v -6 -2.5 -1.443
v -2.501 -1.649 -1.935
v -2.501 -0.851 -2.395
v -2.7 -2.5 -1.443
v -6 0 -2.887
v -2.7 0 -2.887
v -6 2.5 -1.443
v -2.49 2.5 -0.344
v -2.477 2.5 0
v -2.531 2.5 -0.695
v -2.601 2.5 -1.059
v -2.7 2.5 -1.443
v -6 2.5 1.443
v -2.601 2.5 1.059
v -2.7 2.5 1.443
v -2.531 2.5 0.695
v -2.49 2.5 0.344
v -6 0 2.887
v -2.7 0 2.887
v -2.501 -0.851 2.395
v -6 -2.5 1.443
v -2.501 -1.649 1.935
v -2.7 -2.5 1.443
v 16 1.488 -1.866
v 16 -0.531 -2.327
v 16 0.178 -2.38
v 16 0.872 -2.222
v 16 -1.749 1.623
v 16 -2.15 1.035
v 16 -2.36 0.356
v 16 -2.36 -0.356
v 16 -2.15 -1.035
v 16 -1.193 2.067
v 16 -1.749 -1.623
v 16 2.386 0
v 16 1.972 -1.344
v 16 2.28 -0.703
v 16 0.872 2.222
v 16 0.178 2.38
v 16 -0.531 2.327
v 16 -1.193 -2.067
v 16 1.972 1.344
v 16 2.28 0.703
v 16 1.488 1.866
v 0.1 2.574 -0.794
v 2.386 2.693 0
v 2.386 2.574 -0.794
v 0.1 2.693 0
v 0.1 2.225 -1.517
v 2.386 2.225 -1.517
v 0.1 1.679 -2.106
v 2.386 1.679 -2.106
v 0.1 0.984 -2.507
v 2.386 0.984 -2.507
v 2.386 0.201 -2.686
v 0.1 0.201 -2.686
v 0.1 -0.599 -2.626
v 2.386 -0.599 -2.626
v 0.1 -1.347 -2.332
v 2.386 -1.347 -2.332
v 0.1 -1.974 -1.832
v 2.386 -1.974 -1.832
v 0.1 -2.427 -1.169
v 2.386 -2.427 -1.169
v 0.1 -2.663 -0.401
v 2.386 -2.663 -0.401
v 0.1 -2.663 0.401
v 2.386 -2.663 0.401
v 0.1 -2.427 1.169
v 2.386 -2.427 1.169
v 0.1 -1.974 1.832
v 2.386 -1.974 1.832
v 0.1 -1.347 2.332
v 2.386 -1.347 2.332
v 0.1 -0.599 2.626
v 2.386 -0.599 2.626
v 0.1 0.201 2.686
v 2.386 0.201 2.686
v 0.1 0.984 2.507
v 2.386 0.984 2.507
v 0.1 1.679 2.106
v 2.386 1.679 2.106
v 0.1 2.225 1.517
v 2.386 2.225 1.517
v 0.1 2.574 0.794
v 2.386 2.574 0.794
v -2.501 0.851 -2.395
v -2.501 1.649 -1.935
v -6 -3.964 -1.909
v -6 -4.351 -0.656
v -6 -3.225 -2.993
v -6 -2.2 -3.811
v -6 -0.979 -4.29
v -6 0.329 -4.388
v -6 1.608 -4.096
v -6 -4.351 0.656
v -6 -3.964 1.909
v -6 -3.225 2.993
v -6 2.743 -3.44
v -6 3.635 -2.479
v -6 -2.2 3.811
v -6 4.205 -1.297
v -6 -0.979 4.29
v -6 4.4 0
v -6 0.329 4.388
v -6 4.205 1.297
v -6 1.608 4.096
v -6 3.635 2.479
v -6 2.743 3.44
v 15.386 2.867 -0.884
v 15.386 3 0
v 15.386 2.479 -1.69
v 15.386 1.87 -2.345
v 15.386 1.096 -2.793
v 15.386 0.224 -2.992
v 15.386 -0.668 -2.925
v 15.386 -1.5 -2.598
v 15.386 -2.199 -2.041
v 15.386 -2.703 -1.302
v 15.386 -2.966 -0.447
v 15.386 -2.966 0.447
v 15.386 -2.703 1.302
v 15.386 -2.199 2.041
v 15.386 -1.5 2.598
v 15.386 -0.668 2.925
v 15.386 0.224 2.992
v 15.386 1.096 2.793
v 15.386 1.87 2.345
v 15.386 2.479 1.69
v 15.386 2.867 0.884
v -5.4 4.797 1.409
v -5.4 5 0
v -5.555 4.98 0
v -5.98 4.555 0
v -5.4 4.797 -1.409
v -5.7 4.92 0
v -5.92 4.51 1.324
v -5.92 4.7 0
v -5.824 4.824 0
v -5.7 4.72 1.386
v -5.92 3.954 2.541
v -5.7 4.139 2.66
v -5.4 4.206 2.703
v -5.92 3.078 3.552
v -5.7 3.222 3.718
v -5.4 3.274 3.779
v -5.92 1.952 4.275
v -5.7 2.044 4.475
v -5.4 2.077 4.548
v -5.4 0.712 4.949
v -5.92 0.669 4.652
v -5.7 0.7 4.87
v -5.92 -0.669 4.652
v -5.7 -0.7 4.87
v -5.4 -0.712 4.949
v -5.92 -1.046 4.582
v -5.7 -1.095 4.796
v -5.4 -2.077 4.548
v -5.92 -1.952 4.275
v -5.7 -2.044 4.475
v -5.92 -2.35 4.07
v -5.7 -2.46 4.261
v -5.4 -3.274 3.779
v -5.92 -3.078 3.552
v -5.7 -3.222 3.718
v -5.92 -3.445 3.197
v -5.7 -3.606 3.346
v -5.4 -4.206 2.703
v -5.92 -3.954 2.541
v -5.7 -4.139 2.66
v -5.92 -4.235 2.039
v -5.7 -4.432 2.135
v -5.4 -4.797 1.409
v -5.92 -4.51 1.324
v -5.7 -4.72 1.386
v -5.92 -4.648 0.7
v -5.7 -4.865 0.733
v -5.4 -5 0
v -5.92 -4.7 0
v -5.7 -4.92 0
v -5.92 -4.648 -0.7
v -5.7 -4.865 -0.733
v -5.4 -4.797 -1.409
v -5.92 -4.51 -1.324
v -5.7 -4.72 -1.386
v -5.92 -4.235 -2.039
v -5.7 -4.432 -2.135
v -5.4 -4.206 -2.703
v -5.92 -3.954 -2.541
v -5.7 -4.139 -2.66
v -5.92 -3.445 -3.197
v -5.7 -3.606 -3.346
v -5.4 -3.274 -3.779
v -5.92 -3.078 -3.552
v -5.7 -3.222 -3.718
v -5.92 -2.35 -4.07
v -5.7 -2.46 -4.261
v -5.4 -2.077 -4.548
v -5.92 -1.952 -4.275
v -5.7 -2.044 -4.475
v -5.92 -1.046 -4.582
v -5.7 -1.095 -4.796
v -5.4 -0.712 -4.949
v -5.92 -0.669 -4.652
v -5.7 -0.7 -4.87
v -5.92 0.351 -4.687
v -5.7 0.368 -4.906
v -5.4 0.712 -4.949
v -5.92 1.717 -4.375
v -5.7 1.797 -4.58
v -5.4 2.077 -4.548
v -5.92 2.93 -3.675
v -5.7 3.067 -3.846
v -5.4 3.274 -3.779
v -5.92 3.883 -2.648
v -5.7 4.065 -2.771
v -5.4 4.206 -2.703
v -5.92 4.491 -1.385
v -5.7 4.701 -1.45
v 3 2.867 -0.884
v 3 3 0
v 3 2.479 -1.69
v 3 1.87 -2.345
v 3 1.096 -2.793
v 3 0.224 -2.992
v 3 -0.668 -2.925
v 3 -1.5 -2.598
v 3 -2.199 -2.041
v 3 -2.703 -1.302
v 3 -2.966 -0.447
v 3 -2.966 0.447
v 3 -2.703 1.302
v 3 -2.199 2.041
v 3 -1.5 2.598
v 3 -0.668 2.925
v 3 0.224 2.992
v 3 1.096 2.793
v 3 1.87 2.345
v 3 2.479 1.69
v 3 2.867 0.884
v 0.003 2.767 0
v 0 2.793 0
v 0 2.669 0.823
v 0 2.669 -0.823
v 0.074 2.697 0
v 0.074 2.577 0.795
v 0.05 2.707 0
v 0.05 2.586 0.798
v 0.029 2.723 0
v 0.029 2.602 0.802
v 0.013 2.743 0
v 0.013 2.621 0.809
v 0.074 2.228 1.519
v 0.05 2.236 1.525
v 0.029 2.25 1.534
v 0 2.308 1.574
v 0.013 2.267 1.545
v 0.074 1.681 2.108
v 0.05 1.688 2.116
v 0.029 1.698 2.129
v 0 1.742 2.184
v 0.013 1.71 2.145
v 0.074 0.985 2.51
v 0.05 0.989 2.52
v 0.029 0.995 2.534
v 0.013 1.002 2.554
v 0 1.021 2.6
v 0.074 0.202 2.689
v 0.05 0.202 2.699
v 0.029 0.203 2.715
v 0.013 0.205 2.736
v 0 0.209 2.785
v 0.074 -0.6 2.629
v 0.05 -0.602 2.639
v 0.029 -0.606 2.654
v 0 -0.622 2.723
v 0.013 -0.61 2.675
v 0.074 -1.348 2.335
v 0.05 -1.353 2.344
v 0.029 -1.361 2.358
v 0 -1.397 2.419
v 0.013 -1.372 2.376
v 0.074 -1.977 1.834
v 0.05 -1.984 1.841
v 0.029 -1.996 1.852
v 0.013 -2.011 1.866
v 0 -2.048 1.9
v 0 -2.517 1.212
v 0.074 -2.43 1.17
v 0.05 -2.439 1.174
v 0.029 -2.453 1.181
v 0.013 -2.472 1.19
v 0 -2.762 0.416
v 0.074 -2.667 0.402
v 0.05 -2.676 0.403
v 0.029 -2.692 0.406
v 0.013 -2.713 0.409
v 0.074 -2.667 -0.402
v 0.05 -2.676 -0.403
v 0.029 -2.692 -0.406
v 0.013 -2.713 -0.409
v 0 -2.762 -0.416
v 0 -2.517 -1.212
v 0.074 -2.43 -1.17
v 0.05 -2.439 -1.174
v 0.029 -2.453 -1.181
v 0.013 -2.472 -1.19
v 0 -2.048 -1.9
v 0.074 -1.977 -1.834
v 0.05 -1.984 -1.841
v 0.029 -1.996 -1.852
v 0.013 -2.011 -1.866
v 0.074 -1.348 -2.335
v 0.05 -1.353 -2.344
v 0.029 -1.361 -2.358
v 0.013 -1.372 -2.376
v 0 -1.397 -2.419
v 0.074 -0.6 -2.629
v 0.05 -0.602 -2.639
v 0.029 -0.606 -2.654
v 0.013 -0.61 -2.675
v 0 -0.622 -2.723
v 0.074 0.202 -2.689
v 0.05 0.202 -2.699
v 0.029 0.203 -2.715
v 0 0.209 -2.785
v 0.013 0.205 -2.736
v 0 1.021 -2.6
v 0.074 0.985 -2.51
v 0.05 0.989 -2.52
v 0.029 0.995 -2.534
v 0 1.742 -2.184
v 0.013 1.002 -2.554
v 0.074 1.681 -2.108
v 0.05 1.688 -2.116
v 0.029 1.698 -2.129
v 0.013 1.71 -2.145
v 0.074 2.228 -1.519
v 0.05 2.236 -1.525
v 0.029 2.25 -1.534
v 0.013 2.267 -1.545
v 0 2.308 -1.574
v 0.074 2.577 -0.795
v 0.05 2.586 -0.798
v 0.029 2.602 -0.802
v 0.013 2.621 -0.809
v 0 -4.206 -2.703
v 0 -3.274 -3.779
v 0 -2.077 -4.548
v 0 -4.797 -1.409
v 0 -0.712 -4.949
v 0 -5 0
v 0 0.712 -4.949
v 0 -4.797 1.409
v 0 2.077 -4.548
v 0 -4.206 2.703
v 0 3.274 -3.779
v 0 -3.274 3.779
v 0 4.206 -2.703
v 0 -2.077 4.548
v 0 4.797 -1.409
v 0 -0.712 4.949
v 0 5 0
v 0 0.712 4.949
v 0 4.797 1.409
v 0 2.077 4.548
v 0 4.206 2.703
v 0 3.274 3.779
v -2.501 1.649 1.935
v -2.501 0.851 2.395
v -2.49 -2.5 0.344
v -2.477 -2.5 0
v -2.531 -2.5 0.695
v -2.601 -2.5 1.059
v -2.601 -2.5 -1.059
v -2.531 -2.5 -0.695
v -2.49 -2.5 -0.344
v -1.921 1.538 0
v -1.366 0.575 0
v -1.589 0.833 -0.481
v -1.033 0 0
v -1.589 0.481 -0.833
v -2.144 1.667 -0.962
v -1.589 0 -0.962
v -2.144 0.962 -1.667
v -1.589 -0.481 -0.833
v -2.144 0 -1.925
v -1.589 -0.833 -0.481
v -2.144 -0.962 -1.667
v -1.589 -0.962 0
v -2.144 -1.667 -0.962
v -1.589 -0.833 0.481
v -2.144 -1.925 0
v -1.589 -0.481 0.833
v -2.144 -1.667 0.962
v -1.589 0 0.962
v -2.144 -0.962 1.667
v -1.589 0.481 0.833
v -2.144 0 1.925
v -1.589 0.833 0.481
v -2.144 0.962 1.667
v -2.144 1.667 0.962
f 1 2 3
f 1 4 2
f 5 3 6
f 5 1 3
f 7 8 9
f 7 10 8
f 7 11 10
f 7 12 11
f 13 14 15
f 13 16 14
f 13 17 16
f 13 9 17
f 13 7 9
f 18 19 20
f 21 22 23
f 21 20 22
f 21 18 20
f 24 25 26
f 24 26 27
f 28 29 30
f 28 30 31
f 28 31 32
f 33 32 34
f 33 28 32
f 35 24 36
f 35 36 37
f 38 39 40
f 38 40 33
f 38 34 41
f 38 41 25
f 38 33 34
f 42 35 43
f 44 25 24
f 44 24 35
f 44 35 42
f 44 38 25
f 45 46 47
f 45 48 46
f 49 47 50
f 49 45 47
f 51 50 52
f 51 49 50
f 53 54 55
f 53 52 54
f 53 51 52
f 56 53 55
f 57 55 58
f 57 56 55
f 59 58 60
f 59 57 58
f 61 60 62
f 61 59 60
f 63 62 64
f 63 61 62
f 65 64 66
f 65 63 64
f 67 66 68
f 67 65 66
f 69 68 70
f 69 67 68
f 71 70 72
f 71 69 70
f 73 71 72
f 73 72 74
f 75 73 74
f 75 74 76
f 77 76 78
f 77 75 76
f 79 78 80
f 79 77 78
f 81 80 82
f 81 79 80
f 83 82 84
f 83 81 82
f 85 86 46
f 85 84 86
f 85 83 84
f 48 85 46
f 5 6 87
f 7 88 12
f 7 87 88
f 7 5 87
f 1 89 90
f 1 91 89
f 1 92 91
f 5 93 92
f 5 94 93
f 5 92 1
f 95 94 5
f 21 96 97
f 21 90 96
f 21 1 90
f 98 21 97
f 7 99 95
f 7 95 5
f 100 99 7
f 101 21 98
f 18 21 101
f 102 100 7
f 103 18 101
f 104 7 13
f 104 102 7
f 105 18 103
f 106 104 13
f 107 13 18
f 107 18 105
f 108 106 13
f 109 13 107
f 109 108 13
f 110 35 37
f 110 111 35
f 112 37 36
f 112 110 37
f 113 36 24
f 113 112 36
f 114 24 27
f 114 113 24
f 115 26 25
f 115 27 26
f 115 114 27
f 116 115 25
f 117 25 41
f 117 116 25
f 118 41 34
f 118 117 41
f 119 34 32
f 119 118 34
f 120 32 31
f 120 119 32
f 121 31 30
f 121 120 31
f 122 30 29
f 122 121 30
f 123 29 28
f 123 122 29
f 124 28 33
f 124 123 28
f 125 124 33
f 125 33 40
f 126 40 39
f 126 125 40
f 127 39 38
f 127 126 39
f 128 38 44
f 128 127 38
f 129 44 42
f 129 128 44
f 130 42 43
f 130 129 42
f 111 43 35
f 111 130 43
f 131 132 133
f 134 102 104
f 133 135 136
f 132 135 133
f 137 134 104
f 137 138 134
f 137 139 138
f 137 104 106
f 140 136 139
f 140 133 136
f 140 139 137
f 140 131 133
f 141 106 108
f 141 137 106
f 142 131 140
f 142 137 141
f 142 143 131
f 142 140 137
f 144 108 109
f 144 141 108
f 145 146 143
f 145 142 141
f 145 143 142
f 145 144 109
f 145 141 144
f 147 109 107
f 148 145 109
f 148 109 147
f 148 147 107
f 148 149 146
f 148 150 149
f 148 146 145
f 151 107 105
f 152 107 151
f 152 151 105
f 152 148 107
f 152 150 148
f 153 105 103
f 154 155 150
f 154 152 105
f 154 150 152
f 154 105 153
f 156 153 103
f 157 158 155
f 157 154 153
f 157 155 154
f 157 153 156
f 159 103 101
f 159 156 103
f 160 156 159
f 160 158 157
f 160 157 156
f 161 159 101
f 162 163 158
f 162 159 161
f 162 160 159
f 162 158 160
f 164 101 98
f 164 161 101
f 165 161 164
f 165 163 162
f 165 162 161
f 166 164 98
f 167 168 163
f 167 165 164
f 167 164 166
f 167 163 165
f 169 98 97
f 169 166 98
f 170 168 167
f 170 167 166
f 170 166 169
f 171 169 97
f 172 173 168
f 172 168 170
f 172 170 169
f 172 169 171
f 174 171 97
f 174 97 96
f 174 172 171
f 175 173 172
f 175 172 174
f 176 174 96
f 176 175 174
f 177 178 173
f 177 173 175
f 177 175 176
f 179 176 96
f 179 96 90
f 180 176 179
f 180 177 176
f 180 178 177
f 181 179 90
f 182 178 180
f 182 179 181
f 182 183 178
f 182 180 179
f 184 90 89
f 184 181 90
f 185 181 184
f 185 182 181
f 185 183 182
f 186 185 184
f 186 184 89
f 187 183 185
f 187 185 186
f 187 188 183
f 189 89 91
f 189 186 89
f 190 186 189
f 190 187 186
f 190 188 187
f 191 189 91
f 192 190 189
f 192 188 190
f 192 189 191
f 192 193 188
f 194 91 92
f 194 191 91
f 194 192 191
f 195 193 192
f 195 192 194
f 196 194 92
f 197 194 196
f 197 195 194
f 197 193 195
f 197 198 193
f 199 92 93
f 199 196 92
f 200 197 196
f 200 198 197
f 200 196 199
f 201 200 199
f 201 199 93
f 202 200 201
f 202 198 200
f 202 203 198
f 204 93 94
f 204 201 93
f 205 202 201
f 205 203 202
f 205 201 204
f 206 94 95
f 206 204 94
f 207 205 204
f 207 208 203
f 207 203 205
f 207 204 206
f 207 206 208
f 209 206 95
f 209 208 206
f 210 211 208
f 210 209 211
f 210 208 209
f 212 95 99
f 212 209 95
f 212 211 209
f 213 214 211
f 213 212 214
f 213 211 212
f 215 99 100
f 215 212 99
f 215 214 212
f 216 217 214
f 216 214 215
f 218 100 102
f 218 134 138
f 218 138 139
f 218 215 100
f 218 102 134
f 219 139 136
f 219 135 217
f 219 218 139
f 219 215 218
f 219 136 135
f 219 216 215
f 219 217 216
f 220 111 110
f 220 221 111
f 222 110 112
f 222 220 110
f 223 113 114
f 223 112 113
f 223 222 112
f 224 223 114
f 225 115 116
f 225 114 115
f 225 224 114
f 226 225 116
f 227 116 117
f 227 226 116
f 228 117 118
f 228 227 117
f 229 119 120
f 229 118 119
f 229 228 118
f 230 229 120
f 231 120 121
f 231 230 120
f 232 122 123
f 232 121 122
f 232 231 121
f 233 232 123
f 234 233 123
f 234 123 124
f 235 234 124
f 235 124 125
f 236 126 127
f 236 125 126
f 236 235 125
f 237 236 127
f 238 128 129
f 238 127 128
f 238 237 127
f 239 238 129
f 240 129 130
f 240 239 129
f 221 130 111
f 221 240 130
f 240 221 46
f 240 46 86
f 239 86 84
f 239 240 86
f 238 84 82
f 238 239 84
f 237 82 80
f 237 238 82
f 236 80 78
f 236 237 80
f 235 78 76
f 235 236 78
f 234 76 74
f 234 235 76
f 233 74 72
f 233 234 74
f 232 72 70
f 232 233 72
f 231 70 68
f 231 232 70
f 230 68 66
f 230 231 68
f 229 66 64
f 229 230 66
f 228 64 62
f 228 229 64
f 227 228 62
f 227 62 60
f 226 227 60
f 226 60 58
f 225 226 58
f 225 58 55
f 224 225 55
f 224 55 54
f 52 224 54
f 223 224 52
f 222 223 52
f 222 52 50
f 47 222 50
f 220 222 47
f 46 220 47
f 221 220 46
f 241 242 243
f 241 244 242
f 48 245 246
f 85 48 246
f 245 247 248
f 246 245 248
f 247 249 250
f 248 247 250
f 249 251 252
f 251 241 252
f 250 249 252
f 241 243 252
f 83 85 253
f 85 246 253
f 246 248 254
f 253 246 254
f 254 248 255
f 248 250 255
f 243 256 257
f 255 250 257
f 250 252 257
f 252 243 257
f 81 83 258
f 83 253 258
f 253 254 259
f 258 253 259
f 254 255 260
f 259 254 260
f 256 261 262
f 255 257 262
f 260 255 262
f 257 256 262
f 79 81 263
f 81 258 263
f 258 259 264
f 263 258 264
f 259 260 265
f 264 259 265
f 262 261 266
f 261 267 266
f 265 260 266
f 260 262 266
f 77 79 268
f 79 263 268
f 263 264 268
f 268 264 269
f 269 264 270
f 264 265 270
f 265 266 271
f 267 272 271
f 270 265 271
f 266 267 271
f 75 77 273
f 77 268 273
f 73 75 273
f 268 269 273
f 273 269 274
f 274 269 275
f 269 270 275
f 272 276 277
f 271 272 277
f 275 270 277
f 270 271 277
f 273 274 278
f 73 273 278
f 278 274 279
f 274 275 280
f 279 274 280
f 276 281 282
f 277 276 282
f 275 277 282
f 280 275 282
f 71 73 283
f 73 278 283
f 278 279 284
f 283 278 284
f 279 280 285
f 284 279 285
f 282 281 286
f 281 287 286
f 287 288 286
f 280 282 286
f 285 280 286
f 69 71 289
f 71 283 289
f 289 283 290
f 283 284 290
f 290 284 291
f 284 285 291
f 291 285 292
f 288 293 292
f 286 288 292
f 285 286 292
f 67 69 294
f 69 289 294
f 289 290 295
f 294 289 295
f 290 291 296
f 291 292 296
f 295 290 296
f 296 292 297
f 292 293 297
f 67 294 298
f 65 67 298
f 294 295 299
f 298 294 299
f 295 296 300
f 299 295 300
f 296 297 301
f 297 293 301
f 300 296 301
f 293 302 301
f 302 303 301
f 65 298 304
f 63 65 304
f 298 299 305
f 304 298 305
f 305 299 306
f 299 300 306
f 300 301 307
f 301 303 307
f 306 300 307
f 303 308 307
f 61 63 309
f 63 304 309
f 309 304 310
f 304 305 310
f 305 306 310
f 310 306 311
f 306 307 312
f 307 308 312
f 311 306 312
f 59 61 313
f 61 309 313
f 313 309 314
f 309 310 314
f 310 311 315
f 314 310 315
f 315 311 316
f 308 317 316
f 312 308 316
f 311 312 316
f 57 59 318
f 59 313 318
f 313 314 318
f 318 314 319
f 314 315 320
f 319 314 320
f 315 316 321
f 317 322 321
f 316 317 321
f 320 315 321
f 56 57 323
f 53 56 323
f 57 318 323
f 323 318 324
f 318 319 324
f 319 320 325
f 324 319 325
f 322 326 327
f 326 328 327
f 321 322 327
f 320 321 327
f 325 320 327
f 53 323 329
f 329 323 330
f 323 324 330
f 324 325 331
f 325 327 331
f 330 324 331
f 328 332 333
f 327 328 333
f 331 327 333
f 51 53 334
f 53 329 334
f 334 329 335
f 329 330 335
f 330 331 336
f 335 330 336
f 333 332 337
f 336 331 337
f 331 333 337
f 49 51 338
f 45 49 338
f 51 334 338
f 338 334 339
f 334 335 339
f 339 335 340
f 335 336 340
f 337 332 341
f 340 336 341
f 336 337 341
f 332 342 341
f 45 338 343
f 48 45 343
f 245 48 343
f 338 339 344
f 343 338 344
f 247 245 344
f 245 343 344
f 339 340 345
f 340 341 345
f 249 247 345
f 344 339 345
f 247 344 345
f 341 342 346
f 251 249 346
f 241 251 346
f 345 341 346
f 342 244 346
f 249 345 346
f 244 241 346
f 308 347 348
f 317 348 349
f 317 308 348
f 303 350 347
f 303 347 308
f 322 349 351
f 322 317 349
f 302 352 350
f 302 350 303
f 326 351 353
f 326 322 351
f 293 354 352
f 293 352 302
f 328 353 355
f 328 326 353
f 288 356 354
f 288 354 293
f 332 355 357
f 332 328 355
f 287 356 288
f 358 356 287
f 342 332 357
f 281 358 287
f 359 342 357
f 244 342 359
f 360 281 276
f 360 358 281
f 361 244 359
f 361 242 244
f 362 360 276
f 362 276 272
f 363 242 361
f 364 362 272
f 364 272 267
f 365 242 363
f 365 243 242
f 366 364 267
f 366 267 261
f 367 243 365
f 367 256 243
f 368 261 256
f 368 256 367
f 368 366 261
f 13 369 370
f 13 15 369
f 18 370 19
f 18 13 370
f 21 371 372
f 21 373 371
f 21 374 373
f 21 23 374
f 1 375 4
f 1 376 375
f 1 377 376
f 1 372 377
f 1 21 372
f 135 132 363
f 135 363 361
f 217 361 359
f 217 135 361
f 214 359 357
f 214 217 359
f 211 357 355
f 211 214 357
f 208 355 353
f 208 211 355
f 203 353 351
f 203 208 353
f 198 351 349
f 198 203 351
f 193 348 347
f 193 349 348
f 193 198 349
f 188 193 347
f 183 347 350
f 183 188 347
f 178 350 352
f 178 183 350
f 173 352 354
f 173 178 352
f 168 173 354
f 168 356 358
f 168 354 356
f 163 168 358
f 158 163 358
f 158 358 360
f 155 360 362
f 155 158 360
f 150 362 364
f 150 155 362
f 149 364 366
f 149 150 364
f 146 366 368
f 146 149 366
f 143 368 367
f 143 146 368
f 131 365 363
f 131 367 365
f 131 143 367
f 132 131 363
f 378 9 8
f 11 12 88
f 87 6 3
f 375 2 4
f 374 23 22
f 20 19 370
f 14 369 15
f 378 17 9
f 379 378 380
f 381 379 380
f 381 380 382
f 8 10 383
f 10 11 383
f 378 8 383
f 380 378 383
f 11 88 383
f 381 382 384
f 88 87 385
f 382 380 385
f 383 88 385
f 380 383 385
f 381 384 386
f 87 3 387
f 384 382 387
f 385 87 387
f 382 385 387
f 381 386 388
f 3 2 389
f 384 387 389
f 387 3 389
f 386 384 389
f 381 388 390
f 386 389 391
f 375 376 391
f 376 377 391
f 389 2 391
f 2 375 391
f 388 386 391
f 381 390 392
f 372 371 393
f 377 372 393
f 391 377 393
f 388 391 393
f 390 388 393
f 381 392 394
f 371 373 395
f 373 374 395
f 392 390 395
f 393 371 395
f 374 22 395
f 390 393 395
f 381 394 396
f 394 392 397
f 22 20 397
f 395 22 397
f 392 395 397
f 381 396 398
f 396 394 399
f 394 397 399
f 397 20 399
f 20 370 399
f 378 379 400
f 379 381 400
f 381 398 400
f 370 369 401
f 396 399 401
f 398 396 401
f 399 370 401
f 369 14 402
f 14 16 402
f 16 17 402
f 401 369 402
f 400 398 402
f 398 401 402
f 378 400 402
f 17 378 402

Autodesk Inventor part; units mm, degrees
ref_plane "YZ Plane" through (0, 0, 0) normal (1, 0, 0) x (0, 1, 0)
ref_plane "XZ Plane" through (0, 0, 0) normal (0, 1, 0) x (-1, 0, 0)
sketch "Sketch1" plane through (0, 0, 0) normal (0, 0, 1) x (1, 0, 0)
  line L0 (-1.0333, 0) -> (16, 0)
  line L1 (16, 0) -> (16, 3)
  line L2 (16, 3) -> (3, 3)
  line L3 (3, 3) -> (2.3864, 2.6933)
  line L4 (2.3864, 2.6933) -> (0, 2.6933)
  line L5 (0, 2.6933) -> (0, 5)
  line L6 (0, 5) -> (-6, 5)
  line L7 (-6, 5) -> (-6, 2.8868)
  line L8 (-6, 2.8868) -> (-2.7, 2.8868)
  line L9 (-2.7, 2.8868) -> (-1.0333, 0)
  line L10 (-10.4, 0) -> (20.4, 0) projected
  line L11 (0, -1) -> (0, 6) projected
  line L12 (3, 3) -> (0, 3) construction
  dimension "d1" = 13
  dimension "d2" = 0.6136
  dimension "d3" = 6
  dimension "d4" = 3.3
  dimension "d5" = 60
  dimension "d6" = 6
  dimension "d7" = 5.3865
  dimension "d8" = 5.7735
  dimension "d9" = 10
  dimension "d26" = 16
revolve "Body" add sketch "Sketch1" angle 360 about axis through (-1.0333, 0, 0) along (1, 0, 0)
sketch "Sketch2" plane through (-6, 0, 0) normal (-1, 0, 0) x (0, 0, 1)
  circle A0 centre (0, 0) radius 2.8868 projected
  line L0 (0, -7) -> (0, 7) projected
  line L1 (-7, 0) -> (7, 0) projected
  line L2 (2.8868, 0) -> (1.4434, -2.5)
  line L3 (1.4434, -2.5) -> (-1.4434, -2.5)
  line L4 (-1.4434, -2.5) -> (-2.8868, 0)
  line L5 (-2.8868, 0) -> (-1.4434, 2.5)
  line L6 (-1.4434, 2.5) -> (1.4434, 2.5)
  line L7 (1.4434, 2.5) -> (2.8868, 0)
extrude "Slot" add sketch "Sketch2" against normal up to next contours L7 A0 | A0 L2 | L6 L0 A0 | A0 L0 L3 | L0 L6 A0 | A0 L3 L0 | L4 A0 | A0 L5
fillet "Fillet1" radius 0.6 1 edges at (-6, -5, 0)
thread "Thread" size "M6x1" class "6g" standard "ISO Metric profile" length 13
chamfer "Chamfer1" distance 0.6135 distance2 0.6135 1 edges at (16, -3, 0) measured on face at (16, -1.1424, 0.935)
ref_plane "Work Plane1" through (29, 0, 0) normal (0, -1, 0) x (1, 0, 0)
fillet "Fillet2" radius 0.1 1 edges at (0, -2.6933, 0)
equation "\"d1\" = GEL"
equation "\"d3\" = KOH"
equation "\"d4\" = INTI"
equation "\"d6\" = GD"
equation "\"d7\" = BDM"
equation "\"d8\" = 1.1547 * SW"
equation "\"d9\" = KOD"
equation "\"d26\" = NLG"
equation "\"d30\" = R"
equation "\"d17\" = RR"
equation "\"d13\" = GEL"
equation "\"d15\" = -0.5 * SPD + 0.5 * GD"
equation "\"d16\" = GUL"
equation "\"GD\" = NND"
equation "\"NLG\" = 16"
equation "\"GEL\" = 13"
equation "\"KOD\" = 10"
equation "\"KOH\" = NND"
equation "\"INTI\" = 3.3"
equation "\"GAL\" = 0.61345 * PTC"
equation "\"GUL\" = 0.61345 * PTC"
equation "\"BDM\" = 5.3865"
equation "\"SW\" = 5"
equation "\"RR\" = 0.6"
equation "\"SPD\" = NND - 1.2269 * PTC"
equation "\"R\" = 0.1"
equation "\"PHH\" = 0.5"
equation "\"GD1\" = THREADDIA - 1.2269 * PTC"
equation "\"THREADDIA\" = 6"
equation "\"FAWI\" = 45deg"
equation "\"PTC\" = 1"
equation "\"NND\" = 6"
equation "\"TOA\" = 30deg"
equation "\"E0\" = 1.155 * SW"
properties part number "CSN 02 1143 - M6 x 16" material "Steel, Mild"
